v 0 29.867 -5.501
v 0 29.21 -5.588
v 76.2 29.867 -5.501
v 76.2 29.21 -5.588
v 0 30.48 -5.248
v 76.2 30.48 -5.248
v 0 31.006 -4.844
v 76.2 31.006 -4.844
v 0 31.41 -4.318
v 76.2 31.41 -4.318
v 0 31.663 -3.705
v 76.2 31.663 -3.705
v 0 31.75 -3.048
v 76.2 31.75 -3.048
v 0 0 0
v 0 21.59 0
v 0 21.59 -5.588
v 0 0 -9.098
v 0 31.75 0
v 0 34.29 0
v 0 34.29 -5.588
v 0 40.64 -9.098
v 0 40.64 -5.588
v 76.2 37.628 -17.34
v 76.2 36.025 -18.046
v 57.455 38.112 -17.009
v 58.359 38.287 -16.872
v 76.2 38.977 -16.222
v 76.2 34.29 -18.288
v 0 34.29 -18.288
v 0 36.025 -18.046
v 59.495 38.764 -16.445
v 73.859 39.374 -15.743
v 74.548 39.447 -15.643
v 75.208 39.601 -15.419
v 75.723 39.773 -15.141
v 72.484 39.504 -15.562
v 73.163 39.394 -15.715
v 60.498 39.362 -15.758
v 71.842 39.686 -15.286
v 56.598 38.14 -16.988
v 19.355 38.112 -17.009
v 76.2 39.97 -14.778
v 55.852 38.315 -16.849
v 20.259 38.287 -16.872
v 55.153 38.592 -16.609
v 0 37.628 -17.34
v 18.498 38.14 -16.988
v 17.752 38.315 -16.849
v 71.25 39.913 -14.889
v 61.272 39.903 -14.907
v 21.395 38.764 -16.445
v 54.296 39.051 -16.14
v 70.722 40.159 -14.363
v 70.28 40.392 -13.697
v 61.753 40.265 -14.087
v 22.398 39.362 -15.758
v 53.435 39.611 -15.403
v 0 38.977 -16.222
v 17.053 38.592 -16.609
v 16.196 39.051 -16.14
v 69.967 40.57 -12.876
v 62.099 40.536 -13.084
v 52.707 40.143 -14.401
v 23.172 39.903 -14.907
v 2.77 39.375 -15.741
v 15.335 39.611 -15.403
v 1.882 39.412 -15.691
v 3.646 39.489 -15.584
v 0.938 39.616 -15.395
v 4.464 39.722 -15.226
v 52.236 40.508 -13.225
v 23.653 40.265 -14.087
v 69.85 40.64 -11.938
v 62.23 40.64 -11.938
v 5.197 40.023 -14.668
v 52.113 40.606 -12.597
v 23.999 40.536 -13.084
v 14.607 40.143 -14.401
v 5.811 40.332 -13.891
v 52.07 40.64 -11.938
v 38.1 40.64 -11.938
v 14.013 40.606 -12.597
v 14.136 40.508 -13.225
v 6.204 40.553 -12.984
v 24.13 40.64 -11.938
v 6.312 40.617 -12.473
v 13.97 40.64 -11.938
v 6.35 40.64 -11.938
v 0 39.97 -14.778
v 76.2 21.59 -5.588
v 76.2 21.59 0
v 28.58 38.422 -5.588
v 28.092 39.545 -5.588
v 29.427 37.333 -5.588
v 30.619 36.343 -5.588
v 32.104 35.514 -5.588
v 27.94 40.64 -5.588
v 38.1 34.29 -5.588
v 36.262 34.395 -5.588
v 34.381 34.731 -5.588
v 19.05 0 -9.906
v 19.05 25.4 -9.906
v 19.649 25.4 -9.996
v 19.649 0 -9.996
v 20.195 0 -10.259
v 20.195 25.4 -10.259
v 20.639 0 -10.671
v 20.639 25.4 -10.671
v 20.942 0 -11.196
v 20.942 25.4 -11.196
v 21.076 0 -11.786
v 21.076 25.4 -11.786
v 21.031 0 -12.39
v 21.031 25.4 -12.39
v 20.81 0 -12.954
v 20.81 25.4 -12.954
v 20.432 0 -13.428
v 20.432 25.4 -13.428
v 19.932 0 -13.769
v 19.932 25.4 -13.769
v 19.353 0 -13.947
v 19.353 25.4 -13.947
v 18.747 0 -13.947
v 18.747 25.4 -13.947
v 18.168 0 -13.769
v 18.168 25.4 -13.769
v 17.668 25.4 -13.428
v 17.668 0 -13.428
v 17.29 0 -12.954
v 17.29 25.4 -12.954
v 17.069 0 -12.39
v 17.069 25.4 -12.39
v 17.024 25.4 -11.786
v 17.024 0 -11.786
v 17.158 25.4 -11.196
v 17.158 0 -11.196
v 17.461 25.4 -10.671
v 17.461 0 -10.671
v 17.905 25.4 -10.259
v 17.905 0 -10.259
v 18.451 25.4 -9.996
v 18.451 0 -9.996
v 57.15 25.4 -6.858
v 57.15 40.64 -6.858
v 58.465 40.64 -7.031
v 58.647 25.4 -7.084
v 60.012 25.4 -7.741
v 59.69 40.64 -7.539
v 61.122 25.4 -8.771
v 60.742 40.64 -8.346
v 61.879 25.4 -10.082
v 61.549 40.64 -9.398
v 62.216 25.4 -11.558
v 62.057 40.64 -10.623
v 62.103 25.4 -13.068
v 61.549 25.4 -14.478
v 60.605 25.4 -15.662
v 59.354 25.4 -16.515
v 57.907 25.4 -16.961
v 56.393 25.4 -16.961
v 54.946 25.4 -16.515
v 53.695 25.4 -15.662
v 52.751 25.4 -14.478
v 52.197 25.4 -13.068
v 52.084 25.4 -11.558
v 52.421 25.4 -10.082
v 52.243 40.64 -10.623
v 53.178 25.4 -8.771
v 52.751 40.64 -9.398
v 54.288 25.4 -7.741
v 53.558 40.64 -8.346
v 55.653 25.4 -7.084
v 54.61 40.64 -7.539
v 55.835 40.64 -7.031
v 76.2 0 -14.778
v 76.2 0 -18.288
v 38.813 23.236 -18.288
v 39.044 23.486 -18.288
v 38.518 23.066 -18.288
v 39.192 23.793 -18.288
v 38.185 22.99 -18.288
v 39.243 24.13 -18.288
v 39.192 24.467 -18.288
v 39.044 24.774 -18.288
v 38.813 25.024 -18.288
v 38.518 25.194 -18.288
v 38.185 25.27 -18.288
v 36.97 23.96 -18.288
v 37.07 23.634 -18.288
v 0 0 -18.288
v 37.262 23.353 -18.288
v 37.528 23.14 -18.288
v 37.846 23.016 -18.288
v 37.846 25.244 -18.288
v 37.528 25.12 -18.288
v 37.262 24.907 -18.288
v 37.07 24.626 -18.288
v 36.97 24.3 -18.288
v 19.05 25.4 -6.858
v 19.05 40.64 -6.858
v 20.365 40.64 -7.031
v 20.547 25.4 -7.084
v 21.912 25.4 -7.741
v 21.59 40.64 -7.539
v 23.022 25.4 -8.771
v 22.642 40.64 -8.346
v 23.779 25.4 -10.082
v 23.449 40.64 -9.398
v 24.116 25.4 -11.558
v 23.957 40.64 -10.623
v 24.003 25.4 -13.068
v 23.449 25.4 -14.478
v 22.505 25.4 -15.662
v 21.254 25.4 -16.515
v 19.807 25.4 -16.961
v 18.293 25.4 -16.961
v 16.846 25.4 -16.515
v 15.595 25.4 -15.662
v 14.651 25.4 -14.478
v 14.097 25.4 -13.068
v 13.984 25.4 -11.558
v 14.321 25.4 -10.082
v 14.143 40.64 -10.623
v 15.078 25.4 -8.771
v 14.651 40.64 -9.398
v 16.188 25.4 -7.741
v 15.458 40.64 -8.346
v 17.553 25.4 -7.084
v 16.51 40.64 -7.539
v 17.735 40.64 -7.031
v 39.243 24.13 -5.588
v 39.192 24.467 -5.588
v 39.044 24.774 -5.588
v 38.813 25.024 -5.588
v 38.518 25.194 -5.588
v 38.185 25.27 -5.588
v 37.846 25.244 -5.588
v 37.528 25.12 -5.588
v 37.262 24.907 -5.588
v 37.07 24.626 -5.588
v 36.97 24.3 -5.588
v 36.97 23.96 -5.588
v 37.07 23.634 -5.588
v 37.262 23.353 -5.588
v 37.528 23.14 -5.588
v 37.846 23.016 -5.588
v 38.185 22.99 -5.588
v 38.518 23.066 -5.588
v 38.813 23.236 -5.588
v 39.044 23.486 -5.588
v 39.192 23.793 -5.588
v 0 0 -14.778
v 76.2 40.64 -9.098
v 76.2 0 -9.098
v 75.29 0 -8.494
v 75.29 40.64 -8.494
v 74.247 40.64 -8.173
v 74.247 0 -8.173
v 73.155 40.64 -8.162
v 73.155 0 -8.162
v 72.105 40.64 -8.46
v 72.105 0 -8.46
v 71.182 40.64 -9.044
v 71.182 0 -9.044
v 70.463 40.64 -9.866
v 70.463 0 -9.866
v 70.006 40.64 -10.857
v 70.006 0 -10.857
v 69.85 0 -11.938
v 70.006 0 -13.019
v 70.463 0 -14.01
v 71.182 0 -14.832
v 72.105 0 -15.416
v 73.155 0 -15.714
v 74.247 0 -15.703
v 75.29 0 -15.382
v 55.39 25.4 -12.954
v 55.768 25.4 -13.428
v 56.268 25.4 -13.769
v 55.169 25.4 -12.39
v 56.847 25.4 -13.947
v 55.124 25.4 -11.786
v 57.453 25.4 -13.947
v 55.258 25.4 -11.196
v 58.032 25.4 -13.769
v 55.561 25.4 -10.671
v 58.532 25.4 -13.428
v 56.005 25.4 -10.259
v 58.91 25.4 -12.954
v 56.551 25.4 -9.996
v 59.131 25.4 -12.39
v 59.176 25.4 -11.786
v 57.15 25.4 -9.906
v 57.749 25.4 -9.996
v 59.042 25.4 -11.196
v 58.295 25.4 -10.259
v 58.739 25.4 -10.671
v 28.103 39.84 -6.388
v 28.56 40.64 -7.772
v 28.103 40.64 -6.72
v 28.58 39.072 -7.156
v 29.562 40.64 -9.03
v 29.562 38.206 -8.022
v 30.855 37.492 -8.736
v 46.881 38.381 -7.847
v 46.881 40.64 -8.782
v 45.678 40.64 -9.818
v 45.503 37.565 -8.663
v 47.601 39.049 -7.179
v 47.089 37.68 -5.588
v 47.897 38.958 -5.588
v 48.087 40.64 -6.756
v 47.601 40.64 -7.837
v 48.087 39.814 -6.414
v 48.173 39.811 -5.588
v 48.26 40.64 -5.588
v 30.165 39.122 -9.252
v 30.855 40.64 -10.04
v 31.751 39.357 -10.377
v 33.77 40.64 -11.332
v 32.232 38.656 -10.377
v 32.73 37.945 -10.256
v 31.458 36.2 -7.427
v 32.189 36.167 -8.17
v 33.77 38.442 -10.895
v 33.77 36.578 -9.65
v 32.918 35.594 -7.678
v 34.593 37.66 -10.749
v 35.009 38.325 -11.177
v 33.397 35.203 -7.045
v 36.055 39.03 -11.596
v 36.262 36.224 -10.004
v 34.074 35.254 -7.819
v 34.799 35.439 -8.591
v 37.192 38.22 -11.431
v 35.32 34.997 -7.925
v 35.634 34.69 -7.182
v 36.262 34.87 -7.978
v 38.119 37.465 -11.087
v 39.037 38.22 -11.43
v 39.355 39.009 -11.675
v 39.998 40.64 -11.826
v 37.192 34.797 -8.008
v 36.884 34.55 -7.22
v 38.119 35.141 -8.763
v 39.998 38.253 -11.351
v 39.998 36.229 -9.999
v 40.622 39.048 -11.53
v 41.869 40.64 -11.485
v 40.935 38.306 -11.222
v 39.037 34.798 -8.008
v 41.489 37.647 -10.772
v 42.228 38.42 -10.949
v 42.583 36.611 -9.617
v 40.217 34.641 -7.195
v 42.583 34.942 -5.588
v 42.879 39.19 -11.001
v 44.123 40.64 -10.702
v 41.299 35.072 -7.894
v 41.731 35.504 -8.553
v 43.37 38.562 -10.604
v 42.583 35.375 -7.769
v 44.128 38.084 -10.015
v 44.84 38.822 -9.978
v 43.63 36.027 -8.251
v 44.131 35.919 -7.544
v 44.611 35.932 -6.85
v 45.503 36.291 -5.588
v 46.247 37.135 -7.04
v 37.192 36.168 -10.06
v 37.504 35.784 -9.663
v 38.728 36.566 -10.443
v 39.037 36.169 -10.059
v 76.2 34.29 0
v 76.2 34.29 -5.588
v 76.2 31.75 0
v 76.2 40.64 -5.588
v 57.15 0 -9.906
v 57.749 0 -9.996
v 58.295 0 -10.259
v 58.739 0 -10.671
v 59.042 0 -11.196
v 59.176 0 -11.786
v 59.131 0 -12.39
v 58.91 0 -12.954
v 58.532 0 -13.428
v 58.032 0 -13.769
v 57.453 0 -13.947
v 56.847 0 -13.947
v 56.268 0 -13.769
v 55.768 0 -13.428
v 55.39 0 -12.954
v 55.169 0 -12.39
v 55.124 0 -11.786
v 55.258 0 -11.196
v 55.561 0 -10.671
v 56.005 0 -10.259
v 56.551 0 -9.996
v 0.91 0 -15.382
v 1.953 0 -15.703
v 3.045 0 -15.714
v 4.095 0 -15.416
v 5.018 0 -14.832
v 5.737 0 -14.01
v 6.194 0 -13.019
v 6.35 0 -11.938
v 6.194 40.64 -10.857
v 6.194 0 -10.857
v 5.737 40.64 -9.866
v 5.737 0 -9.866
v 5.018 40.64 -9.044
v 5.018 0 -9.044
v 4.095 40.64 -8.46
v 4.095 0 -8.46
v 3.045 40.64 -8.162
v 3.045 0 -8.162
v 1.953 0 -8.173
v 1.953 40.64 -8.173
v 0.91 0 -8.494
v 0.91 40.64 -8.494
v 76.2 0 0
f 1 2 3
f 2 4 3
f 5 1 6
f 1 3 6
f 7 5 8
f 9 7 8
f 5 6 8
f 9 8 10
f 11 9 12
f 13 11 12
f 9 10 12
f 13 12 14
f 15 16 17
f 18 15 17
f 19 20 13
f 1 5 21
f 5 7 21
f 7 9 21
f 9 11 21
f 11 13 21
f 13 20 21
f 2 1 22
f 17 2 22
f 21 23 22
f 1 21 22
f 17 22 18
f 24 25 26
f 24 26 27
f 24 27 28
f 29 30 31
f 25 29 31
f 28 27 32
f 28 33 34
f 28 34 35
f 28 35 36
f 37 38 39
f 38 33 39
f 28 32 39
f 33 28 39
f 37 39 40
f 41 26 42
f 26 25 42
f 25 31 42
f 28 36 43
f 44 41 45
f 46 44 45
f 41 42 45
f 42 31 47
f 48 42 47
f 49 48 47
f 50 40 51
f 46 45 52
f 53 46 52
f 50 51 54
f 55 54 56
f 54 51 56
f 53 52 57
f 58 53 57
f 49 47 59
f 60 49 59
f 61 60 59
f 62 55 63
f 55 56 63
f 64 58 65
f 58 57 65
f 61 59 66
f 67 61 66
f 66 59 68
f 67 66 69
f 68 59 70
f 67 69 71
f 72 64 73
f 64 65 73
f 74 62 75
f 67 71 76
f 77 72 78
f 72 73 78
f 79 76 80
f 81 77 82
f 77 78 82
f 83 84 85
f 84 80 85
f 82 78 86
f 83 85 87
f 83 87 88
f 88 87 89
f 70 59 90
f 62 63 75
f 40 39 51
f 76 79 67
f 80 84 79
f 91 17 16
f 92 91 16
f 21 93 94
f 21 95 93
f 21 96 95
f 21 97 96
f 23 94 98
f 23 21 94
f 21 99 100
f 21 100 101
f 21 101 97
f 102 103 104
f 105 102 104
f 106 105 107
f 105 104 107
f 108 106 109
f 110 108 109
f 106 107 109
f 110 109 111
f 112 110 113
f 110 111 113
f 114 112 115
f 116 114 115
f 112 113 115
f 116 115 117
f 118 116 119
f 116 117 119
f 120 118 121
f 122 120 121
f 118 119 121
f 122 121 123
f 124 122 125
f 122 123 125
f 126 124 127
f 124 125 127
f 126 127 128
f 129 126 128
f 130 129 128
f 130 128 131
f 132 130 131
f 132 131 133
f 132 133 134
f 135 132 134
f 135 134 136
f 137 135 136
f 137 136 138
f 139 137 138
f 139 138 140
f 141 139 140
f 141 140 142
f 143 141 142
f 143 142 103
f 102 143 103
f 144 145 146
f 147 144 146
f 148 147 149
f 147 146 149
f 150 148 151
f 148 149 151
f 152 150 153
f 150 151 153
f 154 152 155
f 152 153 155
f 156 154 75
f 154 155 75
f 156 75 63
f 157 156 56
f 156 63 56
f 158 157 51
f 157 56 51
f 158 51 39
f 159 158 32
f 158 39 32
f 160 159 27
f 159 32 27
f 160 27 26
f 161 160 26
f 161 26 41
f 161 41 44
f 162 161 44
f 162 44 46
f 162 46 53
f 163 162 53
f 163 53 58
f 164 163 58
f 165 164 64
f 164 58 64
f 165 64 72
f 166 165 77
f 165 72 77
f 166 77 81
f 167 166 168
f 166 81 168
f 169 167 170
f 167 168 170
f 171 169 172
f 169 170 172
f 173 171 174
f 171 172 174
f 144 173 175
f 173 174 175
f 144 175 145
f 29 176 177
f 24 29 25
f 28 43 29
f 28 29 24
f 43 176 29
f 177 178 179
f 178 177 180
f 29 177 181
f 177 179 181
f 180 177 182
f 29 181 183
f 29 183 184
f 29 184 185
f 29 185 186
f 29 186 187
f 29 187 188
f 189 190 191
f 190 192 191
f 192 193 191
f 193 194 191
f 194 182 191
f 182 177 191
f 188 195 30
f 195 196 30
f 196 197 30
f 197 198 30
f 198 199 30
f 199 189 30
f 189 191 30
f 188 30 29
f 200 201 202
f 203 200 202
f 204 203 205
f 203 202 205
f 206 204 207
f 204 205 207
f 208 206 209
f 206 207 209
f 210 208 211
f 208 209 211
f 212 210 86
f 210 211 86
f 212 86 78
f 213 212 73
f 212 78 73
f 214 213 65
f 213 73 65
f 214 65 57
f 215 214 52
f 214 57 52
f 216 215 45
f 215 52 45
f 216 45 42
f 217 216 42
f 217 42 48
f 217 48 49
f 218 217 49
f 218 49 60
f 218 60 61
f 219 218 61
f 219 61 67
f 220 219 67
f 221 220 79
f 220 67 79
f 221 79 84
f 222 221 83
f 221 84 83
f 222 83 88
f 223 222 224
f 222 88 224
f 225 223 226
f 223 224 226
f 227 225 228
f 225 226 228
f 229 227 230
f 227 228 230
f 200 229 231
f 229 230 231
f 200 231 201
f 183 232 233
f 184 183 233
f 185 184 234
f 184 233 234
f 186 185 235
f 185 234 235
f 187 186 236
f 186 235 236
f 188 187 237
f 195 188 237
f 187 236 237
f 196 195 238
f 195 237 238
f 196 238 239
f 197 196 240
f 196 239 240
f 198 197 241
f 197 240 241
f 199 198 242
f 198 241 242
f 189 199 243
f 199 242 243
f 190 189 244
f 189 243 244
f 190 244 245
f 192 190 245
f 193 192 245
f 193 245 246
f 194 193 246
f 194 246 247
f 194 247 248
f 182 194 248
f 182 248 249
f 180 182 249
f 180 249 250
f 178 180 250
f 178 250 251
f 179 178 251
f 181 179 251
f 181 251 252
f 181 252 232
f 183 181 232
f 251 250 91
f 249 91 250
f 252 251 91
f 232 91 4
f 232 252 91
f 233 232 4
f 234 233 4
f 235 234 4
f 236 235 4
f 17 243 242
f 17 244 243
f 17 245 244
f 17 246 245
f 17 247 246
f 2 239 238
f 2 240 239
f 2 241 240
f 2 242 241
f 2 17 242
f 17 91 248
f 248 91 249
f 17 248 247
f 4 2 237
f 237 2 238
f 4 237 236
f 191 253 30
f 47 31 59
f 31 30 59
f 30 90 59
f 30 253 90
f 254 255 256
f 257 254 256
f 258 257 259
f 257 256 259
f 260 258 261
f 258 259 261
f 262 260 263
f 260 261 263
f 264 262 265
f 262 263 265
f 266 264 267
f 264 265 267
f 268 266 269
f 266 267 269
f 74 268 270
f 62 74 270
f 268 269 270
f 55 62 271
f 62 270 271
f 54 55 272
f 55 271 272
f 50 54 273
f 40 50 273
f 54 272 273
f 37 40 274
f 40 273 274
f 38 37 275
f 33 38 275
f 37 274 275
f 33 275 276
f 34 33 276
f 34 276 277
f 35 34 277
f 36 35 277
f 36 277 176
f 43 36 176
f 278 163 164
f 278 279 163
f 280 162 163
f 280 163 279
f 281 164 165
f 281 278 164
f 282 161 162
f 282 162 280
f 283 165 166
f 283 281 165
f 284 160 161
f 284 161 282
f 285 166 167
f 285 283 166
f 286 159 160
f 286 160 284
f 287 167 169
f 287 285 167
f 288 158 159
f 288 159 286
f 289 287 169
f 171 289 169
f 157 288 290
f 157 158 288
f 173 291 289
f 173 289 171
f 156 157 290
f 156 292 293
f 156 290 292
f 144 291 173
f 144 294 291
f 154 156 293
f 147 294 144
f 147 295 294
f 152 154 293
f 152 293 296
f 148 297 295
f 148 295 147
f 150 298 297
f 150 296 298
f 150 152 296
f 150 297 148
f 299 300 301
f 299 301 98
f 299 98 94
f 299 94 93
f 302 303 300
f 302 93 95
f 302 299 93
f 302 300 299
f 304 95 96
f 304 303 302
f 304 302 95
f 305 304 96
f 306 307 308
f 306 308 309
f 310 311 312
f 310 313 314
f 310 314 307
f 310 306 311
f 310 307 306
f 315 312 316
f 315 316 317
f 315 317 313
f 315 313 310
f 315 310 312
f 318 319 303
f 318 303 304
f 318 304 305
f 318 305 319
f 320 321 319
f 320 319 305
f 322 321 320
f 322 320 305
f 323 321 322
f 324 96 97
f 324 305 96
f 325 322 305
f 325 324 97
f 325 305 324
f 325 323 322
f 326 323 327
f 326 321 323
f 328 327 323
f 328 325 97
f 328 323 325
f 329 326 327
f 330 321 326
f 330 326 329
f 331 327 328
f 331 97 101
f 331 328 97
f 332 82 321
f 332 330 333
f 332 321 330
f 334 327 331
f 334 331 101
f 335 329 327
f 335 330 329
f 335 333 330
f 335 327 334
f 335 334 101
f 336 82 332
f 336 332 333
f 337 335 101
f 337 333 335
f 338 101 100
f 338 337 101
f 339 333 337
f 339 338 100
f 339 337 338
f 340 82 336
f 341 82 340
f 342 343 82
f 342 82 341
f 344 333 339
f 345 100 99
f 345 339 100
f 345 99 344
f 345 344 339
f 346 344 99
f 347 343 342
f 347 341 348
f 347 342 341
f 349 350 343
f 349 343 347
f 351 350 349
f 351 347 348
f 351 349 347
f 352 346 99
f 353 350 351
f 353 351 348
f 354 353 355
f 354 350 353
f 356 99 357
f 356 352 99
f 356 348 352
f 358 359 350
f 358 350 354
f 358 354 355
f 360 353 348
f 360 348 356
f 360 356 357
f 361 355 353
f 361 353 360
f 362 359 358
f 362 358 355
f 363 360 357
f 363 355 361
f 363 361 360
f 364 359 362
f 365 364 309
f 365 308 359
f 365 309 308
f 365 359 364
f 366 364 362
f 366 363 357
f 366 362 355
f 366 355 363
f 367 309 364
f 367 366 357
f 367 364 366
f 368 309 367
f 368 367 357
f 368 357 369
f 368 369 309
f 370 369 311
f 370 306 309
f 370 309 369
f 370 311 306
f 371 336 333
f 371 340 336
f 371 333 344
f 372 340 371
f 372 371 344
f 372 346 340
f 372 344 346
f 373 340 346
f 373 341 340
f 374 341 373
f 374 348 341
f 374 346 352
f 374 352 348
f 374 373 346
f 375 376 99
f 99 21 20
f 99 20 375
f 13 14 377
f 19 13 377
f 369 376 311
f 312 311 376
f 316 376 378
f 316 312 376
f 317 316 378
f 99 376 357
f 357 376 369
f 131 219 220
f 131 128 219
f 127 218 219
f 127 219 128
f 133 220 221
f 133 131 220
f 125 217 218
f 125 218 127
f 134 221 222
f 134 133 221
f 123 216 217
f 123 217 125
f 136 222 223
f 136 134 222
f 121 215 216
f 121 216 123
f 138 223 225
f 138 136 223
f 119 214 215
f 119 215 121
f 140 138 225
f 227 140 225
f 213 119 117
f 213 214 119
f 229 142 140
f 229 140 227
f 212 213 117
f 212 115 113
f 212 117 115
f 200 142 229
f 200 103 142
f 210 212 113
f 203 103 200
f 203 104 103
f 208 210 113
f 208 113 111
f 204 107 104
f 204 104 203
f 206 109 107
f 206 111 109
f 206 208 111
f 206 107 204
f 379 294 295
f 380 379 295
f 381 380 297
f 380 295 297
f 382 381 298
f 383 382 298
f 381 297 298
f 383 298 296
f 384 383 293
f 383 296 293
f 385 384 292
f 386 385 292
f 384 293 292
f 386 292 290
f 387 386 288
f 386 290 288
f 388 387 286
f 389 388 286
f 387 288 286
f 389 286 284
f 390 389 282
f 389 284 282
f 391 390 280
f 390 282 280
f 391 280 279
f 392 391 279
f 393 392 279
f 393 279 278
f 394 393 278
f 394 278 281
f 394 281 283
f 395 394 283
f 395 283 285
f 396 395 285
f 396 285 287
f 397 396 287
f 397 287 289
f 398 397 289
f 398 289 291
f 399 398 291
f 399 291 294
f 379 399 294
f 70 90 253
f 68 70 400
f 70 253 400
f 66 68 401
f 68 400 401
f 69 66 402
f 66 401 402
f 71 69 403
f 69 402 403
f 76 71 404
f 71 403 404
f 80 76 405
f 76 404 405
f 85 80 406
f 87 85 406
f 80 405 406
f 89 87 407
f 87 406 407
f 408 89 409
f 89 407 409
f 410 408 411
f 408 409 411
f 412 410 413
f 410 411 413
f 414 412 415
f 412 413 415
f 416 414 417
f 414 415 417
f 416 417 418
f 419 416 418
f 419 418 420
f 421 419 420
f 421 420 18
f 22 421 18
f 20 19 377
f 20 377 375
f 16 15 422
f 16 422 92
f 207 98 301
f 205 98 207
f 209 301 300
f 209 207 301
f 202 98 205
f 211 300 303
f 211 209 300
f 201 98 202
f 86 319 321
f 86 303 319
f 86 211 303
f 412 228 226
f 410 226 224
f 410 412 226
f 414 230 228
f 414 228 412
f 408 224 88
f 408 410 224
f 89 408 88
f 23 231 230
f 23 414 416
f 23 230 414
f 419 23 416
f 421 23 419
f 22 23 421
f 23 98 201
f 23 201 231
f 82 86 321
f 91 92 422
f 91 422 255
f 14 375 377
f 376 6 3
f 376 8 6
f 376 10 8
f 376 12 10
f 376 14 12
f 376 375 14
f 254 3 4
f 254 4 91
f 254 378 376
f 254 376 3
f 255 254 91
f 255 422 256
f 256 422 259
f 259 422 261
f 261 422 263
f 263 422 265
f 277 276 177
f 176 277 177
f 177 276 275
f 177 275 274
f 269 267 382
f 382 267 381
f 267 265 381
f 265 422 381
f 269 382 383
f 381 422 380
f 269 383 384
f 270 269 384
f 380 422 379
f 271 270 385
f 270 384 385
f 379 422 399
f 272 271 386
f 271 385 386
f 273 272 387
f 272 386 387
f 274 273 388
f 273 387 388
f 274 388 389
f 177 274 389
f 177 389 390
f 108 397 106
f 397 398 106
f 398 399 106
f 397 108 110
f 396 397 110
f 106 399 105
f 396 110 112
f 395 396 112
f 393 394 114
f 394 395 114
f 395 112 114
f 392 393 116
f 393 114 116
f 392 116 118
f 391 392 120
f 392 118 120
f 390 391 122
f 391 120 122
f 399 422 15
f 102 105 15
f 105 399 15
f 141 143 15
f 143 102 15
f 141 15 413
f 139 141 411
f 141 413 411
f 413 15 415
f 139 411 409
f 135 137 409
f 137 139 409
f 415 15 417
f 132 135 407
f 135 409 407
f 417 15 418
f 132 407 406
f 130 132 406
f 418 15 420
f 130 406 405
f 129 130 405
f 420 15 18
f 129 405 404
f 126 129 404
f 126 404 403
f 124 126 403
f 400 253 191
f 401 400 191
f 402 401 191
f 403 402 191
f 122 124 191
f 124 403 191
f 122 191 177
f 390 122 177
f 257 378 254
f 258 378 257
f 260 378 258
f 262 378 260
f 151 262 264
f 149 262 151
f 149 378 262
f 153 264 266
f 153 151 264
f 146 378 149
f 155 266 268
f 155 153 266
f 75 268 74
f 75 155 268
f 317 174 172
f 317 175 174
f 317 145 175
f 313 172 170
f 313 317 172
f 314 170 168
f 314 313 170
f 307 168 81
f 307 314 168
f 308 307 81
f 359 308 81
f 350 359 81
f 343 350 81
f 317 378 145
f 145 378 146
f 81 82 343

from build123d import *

# Parameters (mm, degrees)
SKETCH2_W           = 18.288
SKETCH2_H           = 40.64
BOSS_EXTRUDE1_DEPTH = 76.2
CUT_EXTRUDE1_REACH  = 90.275
SKETCH3_W           = 5.588
SKETCH3_H           = 6.35
SKETCH3_H_2         = 10.16
CUT_EXTRUDE2_REACH  = 89.289
SKETCH4_R           = 1.143
CUT_EXTRUDE3_REACH  = 90.275
SKETCH5_R           = 2.032
SKETCH6_R           = 5.08
CUT_EXTRUDE4_DEPTH  = 15.24
FILLET1_R           = 6.35
FILLET2_R           = 2.54
SKETCH7_R           = 3.81
CUT_EXTRUDE5_DEPTH  = 89.275141297


with BuildPart() as part:
    # Sketch2 → Boss-Extrude1 (new body)
    with BuildSketch(Plane(origin=(0, 0, 0), x_dir=(0, 0, -1), z_dir=(1, 0, 0))):
        with Locations((9.144, 20.32)):
            Rectangle(SKETCH2_W, SKETCH2_H)
    extrude(amount=BOSS_EXTRUDE1_DEPTH)

    # Sketch3 → Cut-Extrude1 (cut, up to next)
    with BuildSketch(Plane.ZY, mode=Mode.PRIVATE) as cut_extrude1_sk1:
        with Locations((-2.794, 37.465)):
            Rectangle(SKETCH3_W, SKETCH3_H)
    cut_extrude1_tool1 = extrude(cut_extrude1_sk1.sketch, amount=-CUT_EXTRUDE1_REACH, mode=Mode.PRIVATE) & part.part
    # Sketch3 → Cut-Extrude1 (cut, up to next)
    with BuildSketch(Plane.ZY, mode=Mode.PRIVATE) as cut_extrude1_sk2:
        with Locations((-2.794, 26.67)):
            Rectangle(SKETCH3_W, SKETCH3_H_2)
    cut_extrude1_tool2 = extrude(cut_extrude1_sk2.sketch, amount=-CUT_EXTRUDE1_REACH, mode=Mode.PRIVATE) & part.part
    add(cut_extrude1_tool1.solids().sort_by_distance((0, 37.465, -2.794))[0], mode=Mode.SUBTRACT)
    add(cut_extrude1_tool2.solids().sort_by_distance((0, 26.67, -2.794))[0], mode=Mode.SUBTRACT)

    # Sketch4 → Cut-Extrude2 (cut, up to next)
    with BuildSketch(Plane.XY.offset(-5.588), mode=Mode.PRIVATE) as cut_extrude2_sk1:
        with Locations((38.1, 24.13)):
            Circle(SKETCH4_R)
    cut_extrude2_tool1 = extrude(cut_extrude2_sk1.sketch, amount=-CUT_EXTRUDE2_REACH, mode=Mode.PRIVATE) & part.part
    add(cut_extrude2_tool1.solids().sort_by_distance((38.1, 24.13, -5.588))[0], mode=Mode.SUBTRACT)

    # Sketch5 → Cut-Extrude3 (cut, up to next)
    with BuildSketch(Plane(origin=(0, 40.64, 0), x_dir=(1, 0, 0), z_dir=(0, 1, 0)), mode=Mode.PRIVATE) as cut_extrude3_sk1:
        with Locations(Location((57.15, 11.938, 0), (0, 0, 270))):
            Circle(SKETCH5_R)
    cut_extrude3_tool1 = extrude(cut_extrude3_sk1.sketch, amount=-CUT_EXTRUDE3_REACH, mode=Mode.PRIVATE) & part.part
    # Sketch5 → Cut-Extrude3 (cut, up to next)
    with BuildSketch(Plane(origin=(0, 40.64, 0), x_dir=(1, 0, 0), z_dir=(0, 1, 0)), mode=Mode.PRIVATE) as cut_extrude3_sk2:
        with Locations(Location((19.05, 11.938, 0), (0, 0, 270))):
            Circle(SKETCH5_R)
    cut_extrude3_tool2 = extrude(cut_extrude3_sk2.sketch, amount=-CUT_EXTRUDE3_REACH, mode=Mode.PRIVATE) & part.part
    add(cut_extrude3_tool1.solids().sort_by_distance((57.15, 40.64, -11.938))[0], mode=Mode.SUBTRACT)
    add(cut_extrude3_tool2.solids().sort_by_distance((19.05, 40.64, -11.938))[0], mode=Mode.SUBTRACT)

    # Sketch6 → Cut-Extrude4 (cut)
    with BuildSketch(Plane(origin=(0, 40.64, 0), x_dir=(1, 0, 0), z_dir=(0, 1, 0))):
        with Locations(Location((19.05, 11.938, 0), (0, 0, 270))):
            Circle(SKETCH6_R)
        with Locations(Location((57.15, 11.938, 0), (0, 0, 270))):
            Circle(SKETCH6_R)
    extrude(amount=-CUT_EXTRUDE4_DEPTH, mode=Mode.SUBTRACT)

    # Fillet1
    # the kernel refuses this fillet: 6.35 mm, written as the material it takes off along each edge
    with BuildSketch(Plane(origin=(-15.875, 40.64, -18.288), x_dir=(0, -1, 0), z_dir=(1, 0, 0))) as fillet1_piece_1:
        with BuildLine():
            CenterArc((FILLET1_R, -FILLET1_R), FILLET1_R, 90, 90)
            Line((0, -FILLET1_R), (0, 0))
            Line((0, 0), (FILLET1_R, 0))
        make_face()
    extrude(amount=107.95, mode=Mode.SUBTRACT)

    # Fillet2
    fillet2_edges = [part.edges().sort_by_distance(p)[0] for p in [
        (38.1, 31.75, -5.588),
    ]]
    fillet(fillet2_edges, radius=FILLET2_R)

    # Sketch7 → Cut-Extrude5 (cut, through all)
    with BuildSketch(Plane.XZ):
        with Locations((2.54, -11.938)):
            Circle(SKETCH7_R)
        with Locations((73.66, -11.938)):
            Circle(SKETCH7_R)
    extrude(amount=-CUT_EXTRUDE5_DEPTH, mode=Mode.SUBTRACT)

    # Sketch8 → Cut-Revolve3 (revolve, cut)
    with BuildSketch(Plane.XY.offset(-5.588)):
        with BuildLine():
            Line((27.94, 40.64), (48.26, 40.64))
            add(Edge.make_bspline(
                [(27.94, 40.64), (27.94, 34.29), (38.1, 34.29), (48.26, 34.29), (48.26, 40.64)],
                knots=[0, 0, 0, 1.570796327, 1.570796327, 3.141592654, 3.141592654, 3.141592654], degree=2, weights=[1, 0.707106781, 1, 0.707106781, 1]))
        make_face()
    revolve(axis=Axis((76.201, 40.64, -5.588), (-1, 0, 0)), mode=Mode.SUBTRACT)


solid = part.part
